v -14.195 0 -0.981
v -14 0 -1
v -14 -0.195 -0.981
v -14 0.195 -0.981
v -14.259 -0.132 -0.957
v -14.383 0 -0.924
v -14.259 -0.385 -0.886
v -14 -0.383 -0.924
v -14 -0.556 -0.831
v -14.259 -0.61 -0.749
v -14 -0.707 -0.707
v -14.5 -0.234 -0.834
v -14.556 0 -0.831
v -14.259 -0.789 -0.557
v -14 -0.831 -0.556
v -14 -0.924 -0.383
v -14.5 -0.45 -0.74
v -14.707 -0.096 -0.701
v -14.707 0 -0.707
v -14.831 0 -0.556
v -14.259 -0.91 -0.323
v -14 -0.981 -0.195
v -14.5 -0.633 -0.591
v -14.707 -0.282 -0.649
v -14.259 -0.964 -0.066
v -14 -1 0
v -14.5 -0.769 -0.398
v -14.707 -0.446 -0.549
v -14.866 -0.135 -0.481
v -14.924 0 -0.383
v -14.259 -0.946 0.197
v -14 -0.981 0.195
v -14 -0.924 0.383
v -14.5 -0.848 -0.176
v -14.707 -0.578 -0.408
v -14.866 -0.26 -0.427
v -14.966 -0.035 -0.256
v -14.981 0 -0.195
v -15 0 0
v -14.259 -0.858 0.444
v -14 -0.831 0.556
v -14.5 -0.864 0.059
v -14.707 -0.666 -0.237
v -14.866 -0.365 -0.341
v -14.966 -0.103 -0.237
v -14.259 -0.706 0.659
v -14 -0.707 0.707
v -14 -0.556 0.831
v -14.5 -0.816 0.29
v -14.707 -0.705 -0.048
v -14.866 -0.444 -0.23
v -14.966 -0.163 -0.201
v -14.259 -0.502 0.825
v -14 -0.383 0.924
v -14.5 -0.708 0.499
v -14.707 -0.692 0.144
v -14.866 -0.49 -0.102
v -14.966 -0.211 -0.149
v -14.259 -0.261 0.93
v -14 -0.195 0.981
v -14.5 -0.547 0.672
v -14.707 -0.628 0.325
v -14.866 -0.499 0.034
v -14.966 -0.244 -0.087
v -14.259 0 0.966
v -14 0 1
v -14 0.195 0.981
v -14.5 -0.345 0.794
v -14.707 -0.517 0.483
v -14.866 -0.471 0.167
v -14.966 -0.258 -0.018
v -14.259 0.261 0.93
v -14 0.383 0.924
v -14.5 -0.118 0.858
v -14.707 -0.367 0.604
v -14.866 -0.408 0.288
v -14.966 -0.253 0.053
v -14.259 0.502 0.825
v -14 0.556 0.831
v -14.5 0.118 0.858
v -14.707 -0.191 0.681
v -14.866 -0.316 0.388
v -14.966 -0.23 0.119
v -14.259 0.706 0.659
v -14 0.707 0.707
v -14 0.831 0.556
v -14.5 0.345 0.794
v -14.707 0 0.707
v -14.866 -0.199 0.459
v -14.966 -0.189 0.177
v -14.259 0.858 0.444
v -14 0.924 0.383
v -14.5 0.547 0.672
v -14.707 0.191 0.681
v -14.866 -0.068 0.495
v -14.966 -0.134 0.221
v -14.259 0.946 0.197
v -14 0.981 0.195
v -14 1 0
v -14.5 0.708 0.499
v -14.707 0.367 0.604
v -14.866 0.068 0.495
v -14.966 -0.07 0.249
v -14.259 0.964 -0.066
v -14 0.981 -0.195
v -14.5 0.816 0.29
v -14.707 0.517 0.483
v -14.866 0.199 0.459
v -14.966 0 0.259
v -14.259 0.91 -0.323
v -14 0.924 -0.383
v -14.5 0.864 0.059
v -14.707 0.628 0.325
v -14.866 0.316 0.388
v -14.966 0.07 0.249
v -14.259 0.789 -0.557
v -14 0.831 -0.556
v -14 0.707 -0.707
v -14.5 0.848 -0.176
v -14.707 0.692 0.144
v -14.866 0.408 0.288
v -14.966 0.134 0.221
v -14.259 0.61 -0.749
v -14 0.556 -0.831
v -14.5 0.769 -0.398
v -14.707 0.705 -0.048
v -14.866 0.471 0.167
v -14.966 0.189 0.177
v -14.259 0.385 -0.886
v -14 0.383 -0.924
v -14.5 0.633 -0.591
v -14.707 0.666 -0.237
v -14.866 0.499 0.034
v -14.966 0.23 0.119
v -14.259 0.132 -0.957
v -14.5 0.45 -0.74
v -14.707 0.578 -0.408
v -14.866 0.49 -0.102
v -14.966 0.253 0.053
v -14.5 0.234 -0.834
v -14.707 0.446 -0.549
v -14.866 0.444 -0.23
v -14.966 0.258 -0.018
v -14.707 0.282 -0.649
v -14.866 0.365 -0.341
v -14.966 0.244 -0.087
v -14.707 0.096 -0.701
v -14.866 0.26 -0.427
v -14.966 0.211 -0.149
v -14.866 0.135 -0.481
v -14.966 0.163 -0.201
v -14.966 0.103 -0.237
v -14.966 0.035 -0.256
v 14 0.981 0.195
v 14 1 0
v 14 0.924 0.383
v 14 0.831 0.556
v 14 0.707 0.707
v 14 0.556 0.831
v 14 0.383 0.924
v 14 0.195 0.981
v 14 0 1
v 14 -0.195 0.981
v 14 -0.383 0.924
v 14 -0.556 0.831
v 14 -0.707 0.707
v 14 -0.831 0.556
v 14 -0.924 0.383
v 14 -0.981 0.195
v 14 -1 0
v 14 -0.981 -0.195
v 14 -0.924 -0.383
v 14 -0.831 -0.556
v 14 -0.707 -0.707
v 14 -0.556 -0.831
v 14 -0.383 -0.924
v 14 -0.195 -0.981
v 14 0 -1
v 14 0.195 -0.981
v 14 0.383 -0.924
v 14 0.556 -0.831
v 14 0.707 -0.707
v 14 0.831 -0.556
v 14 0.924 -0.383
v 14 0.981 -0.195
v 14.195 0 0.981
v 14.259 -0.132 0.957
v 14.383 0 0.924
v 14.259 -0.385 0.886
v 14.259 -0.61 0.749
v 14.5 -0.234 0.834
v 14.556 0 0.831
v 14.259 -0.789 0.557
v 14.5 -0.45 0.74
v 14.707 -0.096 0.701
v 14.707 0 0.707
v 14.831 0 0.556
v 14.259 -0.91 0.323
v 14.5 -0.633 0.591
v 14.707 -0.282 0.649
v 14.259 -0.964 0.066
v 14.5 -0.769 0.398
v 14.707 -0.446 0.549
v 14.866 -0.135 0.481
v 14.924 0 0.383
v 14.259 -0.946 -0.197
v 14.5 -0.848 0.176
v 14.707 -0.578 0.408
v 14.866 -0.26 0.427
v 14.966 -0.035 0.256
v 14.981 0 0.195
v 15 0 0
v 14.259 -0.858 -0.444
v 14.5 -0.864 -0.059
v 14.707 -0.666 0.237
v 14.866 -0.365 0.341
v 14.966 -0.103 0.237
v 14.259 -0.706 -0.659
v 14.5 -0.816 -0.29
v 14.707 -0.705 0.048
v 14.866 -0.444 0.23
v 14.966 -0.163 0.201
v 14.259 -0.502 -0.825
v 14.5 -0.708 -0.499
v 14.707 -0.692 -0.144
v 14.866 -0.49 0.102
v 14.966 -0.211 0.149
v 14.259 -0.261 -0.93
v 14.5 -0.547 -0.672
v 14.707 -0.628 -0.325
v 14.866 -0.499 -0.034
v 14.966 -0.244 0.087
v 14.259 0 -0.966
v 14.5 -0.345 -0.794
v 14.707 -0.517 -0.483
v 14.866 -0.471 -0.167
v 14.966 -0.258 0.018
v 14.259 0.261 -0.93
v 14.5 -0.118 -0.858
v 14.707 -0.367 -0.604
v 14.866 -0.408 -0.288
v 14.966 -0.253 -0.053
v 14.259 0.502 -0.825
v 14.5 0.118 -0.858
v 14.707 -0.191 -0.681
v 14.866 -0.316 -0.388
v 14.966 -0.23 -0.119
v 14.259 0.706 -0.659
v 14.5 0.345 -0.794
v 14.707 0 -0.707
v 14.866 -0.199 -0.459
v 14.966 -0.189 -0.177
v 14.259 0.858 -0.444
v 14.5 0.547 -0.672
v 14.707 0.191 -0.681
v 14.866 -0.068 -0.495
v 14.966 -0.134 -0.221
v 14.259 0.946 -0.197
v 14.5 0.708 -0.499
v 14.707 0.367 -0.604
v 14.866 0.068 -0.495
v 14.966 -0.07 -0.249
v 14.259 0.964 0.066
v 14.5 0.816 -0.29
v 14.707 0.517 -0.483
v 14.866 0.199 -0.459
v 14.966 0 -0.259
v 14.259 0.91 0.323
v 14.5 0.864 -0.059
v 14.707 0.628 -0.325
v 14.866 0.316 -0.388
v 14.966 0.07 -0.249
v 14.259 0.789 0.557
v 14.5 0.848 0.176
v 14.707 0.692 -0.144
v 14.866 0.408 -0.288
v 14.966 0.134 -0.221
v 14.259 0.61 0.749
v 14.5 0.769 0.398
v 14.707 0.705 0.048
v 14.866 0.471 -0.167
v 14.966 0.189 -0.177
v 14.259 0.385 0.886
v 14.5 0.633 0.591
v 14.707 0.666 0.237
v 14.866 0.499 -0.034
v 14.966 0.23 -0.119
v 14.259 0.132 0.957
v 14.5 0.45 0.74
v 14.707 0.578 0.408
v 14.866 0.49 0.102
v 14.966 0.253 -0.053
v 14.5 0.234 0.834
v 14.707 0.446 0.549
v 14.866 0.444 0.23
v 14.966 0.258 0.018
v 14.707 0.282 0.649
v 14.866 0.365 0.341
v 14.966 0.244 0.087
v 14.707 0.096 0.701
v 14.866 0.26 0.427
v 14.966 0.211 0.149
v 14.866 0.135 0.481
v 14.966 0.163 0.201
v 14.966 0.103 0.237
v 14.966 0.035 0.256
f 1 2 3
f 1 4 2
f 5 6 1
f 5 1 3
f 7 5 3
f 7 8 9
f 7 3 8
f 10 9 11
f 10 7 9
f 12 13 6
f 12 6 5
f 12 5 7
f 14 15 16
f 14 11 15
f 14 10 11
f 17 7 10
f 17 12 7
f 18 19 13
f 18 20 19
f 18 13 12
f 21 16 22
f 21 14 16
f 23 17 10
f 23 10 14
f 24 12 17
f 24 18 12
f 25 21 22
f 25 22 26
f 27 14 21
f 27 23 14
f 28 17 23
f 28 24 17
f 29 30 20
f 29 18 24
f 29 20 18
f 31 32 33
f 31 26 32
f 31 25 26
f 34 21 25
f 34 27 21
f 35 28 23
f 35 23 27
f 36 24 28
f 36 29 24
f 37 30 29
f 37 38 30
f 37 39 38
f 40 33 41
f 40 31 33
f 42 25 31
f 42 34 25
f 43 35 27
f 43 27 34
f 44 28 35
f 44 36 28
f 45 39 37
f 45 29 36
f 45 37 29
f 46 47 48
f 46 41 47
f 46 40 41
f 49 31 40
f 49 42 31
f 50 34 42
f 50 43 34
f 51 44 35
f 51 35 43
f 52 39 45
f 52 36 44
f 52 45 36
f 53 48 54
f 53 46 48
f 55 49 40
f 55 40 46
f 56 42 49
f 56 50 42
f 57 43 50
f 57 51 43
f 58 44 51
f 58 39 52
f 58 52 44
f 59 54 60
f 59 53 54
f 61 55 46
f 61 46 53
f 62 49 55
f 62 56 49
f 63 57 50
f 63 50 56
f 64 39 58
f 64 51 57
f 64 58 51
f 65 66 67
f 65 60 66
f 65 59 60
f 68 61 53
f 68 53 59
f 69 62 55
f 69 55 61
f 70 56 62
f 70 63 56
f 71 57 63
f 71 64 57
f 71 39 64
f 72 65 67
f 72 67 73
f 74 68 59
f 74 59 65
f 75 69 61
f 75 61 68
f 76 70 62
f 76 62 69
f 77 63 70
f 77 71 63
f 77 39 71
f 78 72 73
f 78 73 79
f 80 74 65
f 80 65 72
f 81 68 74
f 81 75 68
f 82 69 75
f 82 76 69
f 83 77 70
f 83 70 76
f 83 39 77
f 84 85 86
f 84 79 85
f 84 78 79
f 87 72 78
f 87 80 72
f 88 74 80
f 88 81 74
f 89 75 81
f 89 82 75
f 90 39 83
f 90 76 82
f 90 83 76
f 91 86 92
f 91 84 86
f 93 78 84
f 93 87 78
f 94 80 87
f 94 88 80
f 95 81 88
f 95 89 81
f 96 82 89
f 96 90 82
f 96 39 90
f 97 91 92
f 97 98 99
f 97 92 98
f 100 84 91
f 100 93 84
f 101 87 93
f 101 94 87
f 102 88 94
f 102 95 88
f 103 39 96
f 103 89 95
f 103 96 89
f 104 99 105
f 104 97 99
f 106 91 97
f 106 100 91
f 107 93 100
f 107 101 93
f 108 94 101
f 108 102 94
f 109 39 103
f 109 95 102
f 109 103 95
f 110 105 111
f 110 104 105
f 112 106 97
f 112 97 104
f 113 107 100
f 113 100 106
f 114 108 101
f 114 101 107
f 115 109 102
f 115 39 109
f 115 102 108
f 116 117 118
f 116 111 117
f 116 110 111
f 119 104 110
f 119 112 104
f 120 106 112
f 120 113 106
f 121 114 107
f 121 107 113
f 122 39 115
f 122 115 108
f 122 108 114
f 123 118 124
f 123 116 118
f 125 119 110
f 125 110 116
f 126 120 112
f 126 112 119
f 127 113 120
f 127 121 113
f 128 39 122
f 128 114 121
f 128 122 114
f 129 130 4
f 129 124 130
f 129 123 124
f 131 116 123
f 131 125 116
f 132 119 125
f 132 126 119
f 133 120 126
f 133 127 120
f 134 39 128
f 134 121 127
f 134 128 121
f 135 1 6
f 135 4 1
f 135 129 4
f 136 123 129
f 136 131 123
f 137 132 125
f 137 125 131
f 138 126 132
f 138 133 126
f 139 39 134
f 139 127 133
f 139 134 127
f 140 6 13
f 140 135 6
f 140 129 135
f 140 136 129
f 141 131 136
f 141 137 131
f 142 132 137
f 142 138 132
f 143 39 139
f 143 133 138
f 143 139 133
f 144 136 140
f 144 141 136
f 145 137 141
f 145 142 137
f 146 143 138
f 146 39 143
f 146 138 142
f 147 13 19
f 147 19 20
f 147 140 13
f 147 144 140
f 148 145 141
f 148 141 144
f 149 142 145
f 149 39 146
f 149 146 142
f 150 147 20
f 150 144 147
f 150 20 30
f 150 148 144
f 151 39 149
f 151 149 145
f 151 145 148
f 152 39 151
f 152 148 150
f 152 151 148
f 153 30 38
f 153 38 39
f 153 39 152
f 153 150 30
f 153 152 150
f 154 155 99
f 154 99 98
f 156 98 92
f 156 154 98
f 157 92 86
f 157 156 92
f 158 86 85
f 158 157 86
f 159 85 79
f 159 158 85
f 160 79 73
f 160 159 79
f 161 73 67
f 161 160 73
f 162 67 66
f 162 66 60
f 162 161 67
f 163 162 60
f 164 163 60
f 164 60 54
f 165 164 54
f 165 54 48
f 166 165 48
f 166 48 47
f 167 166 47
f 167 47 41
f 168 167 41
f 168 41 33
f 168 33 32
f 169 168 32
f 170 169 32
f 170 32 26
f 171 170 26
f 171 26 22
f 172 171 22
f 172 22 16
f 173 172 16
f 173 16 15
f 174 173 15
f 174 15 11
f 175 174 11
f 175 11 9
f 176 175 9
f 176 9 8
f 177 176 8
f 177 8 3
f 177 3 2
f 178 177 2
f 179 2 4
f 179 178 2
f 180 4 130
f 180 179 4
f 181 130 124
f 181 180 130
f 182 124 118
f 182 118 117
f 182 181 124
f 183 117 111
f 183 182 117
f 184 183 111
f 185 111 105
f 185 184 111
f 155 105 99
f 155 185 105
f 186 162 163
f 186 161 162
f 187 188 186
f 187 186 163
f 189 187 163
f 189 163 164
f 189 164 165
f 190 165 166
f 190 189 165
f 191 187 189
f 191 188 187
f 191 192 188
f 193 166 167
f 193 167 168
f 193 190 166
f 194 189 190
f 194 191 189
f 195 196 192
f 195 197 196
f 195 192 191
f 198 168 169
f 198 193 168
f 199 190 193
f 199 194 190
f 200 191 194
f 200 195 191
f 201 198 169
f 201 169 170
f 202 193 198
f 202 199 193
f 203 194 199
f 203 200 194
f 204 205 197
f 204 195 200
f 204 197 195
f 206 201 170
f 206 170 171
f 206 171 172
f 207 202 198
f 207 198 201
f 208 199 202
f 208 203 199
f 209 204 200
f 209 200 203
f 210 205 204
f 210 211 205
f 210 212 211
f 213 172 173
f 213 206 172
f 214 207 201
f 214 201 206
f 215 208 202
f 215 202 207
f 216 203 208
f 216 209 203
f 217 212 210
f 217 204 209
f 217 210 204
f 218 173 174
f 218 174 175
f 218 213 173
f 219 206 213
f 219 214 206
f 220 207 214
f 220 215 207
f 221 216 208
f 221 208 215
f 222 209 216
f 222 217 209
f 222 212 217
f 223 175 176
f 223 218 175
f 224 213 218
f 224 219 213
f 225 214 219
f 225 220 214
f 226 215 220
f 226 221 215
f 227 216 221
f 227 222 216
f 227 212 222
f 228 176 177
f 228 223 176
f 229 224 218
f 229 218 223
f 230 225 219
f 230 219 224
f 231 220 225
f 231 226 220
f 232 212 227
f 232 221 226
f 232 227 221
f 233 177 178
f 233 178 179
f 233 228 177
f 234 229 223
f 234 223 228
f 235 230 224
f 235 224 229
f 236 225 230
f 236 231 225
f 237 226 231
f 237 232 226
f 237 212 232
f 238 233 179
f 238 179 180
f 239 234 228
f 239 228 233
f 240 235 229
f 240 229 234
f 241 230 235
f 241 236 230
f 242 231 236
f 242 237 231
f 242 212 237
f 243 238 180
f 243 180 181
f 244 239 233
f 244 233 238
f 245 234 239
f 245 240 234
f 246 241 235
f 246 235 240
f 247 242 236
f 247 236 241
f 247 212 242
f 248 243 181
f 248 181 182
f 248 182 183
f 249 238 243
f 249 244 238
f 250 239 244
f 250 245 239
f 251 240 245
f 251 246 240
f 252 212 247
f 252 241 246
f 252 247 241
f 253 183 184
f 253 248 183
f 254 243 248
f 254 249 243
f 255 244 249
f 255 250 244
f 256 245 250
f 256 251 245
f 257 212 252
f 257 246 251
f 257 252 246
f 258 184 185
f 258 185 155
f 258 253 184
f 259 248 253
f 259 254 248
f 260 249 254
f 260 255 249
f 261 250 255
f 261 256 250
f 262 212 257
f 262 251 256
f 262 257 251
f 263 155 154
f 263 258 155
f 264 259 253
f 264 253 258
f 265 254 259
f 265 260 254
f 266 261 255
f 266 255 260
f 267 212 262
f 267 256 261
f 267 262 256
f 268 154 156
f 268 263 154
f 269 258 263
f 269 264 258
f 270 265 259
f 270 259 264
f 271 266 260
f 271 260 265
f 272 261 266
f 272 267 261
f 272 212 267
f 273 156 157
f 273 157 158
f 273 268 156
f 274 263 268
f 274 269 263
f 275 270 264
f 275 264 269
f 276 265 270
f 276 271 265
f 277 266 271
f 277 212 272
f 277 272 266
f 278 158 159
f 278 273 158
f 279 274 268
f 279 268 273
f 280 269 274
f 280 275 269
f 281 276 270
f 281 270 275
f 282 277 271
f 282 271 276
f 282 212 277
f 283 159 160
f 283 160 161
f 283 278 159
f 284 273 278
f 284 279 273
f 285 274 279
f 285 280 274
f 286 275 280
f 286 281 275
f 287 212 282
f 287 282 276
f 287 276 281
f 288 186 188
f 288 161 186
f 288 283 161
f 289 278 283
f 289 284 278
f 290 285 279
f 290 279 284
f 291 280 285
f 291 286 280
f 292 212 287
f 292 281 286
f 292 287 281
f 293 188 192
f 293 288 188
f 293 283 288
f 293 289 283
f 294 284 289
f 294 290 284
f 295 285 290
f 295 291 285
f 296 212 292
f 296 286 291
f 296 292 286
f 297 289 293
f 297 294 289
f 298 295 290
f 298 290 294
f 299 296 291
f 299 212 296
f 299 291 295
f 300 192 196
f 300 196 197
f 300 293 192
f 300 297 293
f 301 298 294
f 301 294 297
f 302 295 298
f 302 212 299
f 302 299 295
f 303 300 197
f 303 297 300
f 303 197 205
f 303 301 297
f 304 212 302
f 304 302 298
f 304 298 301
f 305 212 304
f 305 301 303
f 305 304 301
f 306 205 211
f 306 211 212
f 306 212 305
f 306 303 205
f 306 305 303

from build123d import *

# Parameters (mm, degrees)
SKETCH1_W         = 28
SKETCH1_H         = 1
DOME1_FACE_RADIUS = 1
DOME1_HEIGHT      = 1
DOME2_FACE_RADIUS = 1
DOME2_HEIGHT      = 1


with BuildPart() as part:
    # Sketch1 → Revolve1 (revolve)
    with BuildSketch(Plane.XY):
        with Locations((0, 0.5)):
            Rectangle(SKETCH1_W, SKETCH1_H)
    revolve(axis=Axis((-14, 0, 0), (1, 0, 0)))

    # Dome1: a dome of height H over a round flat face of radius A is a cap of a sphere of radius (A * A + H * H) / (2 * H)
    dome1_r = (DOME1_FACE_RADIUS * DOME1_FACE_RADIUS + DOME1_HEIGHT * DOME1_HEIGHT) / (2 * DOME1_HEIGHT)
    dome1_base = Plane((-14, 0, 0), z_dir=(-1, 0, 0))
    with Locations(dome1_base.offset(DOME1_HEIGHT - dome1_r)):
        dome1_ball = Sphere(dome1_r, mode=Mode.PRIVATE)
    add(split(dome1_ball, bisect_by=dome1_base, keep=Keep.TOP, mode=Mode.PRIVATE))

    # Dome2: a dome of height H over a round flat face of radius A is a cap of a sphere of radius (A * A + H * H) / (2 * H)
    dome2_r = (DOME2_FACE_RADIUS * DOME2_FACE_RADIUS + DOME2_HEIGHT * DOME2_HEIGHT) / (2 * DOME2_HEIGHT)
    dome2_base = Plane((14, 0, 0), z_dir=(1, 0, 0))
    with Locations(dome2_base.offset(DOME2_HEIGHT - dome2_r)):
        dome2_ball = Sphere(dome2_r, mode=Mode.PRIVATE)
    add(split(dome2_ball, bisect_by=dome2_base, keep=Keep.TOP, mode=Mode.PRIVATE))


solid = part.part
